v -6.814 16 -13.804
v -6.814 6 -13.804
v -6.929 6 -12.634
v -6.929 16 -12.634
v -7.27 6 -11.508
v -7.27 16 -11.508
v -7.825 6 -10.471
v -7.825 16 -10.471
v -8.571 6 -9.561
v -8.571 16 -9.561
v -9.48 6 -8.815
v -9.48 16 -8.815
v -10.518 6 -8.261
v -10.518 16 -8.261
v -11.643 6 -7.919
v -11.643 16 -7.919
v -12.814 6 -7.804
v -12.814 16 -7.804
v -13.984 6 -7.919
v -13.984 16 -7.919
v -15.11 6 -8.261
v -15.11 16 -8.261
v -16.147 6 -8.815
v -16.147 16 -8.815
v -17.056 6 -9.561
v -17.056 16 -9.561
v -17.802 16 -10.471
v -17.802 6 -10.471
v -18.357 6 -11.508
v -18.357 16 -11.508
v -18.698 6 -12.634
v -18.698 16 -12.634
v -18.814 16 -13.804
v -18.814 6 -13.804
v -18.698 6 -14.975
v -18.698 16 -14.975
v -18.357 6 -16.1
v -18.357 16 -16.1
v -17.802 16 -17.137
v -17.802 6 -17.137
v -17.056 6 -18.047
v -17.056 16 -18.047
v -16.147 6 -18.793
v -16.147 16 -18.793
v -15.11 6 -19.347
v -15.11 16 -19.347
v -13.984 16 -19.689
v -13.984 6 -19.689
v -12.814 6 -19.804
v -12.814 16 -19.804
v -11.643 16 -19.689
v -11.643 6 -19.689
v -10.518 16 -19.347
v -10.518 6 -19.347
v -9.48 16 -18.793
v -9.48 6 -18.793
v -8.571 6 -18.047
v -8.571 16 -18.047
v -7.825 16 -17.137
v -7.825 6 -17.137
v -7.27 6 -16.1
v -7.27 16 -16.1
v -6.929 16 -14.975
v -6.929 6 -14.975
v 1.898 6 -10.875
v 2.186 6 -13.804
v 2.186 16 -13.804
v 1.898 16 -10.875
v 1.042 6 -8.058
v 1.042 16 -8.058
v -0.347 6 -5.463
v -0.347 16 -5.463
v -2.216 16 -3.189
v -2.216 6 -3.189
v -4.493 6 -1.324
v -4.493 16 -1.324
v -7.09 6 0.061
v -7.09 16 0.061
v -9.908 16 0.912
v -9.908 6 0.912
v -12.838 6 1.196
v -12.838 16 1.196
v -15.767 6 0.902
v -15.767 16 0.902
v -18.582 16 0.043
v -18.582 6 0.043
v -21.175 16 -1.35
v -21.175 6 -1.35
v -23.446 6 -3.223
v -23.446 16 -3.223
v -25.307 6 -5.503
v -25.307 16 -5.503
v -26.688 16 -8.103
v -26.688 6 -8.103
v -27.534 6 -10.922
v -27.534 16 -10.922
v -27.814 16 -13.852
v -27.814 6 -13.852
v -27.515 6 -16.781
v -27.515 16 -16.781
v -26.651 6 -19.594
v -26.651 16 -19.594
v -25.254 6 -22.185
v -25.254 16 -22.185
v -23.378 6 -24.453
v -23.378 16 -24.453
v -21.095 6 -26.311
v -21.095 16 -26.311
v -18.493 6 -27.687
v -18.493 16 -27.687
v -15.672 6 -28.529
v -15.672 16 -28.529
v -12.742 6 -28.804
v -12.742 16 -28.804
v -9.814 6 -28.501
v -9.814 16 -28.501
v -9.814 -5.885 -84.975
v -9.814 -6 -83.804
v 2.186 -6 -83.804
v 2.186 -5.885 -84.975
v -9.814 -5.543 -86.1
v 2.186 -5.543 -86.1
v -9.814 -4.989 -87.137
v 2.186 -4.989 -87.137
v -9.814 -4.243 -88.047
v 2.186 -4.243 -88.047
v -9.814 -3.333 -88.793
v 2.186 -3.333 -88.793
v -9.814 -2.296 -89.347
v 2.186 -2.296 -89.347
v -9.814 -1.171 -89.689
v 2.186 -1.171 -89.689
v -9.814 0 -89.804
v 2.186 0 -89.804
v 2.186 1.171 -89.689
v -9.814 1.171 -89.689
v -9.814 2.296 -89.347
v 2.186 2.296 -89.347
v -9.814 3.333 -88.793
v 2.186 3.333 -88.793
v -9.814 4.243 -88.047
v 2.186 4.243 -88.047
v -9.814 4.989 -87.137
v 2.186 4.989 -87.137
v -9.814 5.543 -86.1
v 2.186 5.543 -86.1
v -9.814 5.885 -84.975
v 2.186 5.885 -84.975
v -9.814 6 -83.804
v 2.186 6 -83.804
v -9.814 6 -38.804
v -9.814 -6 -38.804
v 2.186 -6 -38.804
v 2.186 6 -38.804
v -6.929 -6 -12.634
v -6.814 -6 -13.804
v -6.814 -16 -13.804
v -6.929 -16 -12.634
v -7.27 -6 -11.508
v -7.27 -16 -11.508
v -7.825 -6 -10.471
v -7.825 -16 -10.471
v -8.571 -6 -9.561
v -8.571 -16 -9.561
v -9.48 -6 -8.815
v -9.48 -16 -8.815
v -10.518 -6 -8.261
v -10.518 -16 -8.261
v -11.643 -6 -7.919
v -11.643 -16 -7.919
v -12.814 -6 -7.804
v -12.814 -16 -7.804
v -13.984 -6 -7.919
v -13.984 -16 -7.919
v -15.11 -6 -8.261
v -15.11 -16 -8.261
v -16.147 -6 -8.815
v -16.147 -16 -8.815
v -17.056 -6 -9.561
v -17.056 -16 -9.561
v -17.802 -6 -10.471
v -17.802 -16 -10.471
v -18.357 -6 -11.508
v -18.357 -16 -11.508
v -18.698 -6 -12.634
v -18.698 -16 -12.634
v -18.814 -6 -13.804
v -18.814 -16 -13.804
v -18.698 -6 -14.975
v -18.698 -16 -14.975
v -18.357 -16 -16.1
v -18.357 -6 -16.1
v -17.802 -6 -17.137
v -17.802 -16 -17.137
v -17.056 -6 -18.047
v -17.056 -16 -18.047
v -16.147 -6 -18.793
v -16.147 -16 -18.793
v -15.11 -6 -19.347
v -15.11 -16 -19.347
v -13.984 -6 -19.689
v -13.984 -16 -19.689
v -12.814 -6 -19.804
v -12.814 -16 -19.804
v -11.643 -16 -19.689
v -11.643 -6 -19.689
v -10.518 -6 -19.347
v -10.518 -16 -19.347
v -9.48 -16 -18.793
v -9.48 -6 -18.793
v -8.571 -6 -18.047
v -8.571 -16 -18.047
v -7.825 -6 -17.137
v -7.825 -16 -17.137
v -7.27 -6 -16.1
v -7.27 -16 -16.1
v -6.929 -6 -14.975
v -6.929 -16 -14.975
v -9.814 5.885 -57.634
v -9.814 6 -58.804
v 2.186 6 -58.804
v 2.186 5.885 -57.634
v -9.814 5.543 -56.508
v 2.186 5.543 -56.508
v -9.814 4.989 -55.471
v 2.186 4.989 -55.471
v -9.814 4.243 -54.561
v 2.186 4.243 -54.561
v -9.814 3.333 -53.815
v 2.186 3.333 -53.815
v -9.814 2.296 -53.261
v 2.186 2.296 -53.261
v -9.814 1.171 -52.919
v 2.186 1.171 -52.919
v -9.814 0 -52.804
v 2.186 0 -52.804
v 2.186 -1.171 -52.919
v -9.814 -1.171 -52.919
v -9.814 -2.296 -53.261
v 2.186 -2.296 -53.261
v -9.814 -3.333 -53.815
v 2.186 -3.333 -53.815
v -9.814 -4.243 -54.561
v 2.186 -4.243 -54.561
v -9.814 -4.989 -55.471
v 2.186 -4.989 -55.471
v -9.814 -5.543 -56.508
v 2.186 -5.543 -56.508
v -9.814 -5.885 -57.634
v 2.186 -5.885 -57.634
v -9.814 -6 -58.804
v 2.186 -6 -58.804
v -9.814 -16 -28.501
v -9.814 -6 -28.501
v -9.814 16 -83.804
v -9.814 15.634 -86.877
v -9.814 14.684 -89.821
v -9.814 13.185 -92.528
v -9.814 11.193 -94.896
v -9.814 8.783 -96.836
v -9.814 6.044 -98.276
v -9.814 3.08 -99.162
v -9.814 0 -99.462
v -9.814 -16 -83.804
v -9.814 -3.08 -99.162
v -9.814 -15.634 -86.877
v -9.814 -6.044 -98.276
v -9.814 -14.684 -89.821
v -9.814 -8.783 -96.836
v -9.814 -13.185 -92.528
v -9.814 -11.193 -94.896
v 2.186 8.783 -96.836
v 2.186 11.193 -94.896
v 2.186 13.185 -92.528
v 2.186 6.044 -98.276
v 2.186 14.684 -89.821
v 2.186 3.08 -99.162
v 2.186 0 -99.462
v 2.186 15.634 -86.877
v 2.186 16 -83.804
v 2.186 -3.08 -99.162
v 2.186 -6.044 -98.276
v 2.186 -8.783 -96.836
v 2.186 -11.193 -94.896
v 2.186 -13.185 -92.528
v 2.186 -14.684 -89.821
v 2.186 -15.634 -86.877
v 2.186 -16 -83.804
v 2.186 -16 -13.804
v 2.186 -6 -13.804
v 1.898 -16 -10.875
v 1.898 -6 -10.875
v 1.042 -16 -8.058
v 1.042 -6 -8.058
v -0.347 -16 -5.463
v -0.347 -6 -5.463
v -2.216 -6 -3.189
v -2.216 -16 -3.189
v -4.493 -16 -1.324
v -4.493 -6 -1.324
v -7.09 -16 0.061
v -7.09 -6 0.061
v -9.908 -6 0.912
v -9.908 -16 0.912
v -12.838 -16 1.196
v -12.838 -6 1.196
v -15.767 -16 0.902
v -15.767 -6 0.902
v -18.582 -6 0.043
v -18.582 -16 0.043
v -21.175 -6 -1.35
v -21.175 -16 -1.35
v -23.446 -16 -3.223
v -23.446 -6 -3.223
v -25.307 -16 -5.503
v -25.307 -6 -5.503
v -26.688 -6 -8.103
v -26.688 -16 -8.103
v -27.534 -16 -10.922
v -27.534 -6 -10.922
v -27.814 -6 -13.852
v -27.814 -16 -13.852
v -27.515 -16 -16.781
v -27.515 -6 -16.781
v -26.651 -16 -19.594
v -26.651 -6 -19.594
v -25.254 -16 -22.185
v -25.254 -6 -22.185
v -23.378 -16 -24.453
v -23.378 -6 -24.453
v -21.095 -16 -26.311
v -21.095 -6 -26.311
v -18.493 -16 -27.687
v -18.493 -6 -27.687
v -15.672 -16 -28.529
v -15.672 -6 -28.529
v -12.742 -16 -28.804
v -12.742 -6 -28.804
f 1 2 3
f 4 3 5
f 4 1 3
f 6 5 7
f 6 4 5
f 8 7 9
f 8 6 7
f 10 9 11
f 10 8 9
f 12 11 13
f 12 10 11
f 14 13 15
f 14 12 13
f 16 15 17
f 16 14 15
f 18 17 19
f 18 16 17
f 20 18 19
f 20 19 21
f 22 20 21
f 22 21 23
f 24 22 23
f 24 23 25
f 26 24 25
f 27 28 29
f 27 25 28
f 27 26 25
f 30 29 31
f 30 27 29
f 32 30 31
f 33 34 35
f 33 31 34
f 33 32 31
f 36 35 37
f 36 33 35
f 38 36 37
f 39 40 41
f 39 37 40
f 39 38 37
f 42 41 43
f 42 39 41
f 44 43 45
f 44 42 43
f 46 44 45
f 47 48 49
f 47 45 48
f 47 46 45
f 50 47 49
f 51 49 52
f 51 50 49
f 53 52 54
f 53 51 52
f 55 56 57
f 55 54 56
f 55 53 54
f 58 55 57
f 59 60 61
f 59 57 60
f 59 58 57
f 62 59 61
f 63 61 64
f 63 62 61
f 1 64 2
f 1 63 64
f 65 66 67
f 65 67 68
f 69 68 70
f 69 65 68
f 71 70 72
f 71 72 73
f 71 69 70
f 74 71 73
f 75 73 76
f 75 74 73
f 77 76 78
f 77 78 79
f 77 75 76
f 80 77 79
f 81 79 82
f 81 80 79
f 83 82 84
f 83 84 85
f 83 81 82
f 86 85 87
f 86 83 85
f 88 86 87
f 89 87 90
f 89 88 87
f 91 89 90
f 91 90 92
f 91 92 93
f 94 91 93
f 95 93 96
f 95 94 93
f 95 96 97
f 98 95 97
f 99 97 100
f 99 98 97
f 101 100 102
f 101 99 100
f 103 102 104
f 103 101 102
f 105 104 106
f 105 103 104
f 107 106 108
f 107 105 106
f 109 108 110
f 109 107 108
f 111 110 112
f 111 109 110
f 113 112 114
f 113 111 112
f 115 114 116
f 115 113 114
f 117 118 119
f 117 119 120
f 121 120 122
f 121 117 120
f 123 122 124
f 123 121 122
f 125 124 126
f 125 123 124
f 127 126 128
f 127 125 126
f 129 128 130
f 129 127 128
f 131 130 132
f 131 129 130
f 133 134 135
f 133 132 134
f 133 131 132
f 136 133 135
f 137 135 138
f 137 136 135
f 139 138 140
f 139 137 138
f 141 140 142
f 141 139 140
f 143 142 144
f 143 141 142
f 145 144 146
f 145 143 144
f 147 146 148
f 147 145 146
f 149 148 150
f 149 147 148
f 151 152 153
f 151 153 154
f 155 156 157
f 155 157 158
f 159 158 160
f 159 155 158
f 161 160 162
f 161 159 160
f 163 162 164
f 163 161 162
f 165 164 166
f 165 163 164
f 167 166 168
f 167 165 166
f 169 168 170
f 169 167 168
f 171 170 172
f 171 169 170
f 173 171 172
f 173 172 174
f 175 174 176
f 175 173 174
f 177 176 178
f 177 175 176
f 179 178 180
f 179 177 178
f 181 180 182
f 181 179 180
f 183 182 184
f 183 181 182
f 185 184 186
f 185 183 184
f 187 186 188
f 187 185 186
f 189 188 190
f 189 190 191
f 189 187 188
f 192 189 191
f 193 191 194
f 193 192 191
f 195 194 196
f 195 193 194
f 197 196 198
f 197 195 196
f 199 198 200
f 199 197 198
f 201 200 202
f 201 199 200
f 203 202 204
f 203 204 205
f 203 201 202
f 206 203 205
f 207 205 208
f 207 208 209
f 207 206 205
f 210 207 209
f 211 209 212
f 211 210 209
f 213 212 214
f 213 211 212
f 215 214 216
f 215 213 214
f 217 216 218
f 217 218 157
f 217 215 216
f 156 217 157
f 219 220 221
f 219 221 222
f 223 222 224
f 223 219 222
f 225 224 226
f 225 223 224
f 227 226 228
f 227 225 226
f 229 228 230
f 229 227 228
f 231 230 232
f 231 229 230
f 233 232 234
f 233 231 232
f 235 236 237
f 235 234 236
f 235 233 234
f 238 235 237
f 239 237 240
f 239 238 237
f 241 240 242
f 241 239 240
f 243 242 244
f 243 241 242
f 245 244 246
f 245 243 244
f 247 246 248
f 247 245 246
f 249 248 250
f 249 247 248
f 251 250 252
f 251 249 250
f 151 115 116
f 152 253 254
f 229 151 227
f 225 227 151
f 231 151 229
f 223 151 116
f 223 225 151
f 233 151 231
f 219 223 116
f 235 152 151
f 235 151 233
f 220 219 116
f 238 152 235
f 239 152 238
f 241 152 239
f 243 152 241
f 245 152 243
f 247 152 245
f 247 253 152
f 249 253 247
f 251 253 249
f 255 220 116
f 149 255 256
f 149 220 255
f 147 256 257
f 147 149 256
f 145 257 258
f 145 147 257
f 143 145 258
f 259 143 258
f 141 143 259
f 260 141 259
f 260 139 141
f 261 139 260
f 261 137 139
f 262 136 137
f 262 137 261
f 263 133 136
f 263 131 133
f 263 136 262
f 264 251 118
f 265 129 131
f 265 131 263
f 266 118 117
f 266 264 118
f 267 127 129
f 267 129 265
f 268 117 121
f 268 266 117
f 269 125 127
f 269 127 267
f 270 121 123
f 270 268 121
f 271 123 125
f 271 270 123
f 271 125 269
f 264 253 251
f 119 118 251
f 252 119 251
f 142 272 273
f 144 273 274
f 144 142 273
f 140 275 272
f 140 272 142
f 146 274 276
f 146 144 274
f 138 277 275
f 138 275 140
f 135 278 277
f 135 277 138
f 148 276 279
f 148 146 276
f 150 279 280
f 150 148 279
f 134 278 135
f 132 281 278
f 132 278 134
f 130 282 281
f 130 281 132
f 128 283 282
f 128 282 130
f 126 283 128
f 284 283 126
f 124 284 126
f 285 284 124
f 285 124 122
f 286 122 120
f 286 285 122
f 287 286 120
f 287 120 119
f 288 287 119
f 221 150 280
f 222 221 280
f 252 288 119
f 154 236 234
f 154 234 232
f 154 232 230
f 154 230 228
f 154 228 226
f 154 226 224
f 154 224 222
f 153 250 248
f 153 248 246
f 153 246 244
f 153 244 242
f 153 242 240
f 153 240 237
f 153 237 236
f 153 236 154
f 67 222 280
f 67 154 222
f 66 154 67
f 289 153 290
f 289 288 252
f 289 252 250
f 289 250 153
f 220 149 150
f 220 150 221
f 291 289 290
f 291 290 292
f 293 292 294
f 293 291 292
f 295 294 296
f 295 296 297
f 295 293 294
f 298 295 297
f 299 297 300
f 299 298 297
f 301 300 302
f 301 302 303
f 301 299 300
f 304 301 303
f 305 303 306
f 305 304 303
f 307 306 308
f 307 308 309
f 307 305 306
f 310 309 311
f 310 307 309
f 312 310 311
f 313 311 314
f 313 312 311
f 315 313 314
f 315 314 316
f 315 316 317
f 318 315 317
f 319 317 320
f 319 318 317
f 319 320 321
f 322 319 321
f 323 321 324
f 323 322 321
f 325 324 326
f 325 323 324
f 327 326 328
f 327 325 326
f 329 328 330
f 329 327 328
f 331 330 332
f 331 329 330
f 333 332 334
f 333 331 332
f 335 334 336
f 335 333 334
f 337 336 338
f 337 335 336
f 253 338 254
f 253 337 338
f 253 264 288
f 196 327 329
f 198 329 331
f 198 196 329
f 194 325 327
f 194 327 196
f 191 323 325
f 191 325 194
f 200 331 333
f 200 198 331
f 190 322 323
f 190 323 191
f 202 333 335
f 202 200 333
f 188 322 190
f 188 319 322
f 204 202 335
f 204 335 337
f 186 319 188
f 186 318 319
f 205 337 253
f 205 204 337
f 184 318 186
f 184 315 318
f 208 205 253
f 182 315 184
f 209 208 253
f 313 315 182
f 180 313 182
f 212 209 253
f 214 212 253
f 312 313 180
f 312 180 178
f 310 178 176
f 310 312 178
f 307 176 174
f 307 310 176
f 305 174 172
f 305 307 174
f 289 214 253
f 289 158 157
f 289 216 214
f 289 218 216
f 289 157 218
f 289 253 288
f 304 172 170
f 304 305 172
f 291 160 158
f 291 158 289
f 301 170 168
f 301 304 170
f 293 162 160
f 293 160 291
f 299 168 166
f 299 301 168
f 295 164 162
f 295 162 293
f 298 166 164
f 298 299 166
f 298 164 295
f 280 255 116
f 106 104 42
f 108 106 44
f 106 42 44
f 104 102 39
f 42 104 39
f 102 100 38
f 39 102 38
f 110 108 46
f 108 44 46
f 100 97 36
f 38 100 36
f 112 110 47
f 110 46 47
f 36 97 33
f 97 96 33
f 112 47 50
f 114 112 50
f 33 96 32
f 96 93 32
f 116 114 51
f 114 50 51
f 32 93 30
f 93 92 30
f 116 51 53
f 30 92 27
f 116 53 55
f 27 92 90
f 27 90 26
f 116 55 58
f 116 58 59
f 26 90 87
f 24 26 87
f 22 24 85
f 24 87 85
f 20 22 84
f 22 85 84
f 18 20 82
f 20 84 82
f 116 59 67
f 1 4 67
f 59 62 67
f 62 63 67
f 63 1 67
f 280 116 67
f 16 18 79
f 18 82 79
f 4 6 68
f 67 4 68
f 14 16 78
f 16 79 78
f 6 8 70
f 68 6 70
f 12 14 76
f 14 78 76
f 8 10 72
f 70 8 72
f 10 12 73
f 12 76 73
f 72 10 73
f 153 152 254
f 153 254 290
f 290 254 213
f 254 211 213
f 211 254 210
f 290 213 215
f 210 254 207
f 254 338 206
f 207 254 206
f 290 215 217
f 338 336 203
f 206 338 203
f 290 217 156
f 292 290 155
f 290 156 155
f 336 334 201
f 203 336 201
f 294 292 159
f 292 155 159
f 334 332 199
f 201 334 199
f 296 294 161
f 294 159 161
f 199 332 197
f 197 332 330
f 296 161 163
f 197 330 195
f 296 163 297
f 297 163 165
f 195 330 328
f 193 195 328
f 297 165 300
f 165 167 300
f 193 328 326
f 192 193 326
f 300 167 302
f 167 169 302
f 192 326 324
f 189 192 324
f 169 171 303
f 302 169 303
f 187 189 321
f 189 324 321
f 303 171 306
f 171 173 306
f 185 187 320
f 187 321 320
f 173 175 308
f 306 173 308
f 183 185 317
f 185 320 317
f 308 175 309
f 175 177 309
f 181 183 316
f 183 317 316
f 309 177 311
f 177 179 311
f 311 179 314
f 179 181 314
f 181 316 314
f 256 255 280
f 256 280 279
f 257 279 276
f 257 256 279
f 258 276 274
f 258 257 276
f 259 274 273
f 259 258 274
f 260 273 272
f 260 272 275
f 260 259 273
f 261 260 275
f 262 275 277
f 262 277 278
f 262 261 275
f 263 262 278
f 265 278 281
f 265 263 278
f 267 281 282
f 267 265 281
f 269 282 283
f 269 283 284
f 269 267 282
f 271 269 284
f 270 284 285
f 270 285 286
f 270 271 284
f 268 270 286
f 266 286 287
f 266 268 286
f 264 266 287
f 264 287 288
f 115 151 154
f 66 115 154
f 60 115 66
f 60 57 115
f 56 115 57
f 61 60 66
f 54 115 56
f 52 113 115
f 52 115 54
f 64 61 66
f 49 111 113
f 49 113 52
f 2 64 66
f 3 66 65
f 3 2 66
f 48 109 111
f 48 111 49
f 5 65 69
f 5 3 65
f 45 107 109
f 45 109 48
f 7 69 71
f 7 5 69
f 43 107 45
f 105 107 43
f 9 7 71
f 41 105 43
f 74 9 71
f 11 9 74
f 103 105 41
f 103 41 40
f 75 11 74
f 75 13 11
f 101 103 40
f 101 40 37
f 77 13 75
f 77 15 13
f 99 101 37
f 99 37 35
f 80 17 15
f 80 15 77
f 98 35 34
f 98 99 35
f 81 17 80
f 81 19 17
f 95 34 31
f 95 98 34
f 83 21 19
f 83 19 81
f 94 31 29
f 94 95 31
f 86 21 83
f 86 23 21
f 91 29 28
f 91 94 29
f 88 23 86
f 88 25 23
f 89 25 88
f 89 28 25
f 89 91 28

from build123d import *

# Parameters (mm, degrees)
F0_R     = 6
F1_DEPTH = 16
F3_W     = 12
F3_H     = 25
F3_H_2   = 40
F4_DEPTH = 32.187343


with BuildPart() as f1:
    # F0 (on Front) → F1 (new body, symmetric)
    with BuildSketch(Plane.XZ):
        with BuildLine():
            Line((2.186343, -99.804071), (2.186343, -13.804071))
            ThreePointArc((2.186343, -13.804071), (-24.432607, -4.317238), (-9.813657, -28.501009))
            Line((-9.813657, -28.501009), (-9.813657, -99.804071))
            Line((-9.813657, -99.804071), (2.186343, -99.804071))
        make_face()
        with Locations((-12.813657, -13.804071)):
            Circle(F0_R, mode=Mode.SUBTRACT)
    extrude(amount=F1_DEPTH, both=True)

    # F3 (on offset) → F4 (cut, through all)
    with BuildSketch(Plane.YZ.offset(-30)):
        with BuildLine():
            ThreePointArc((16, -83.804071), (0, -99.461515), (-16, -83.804071))
            Line((-16, -83.804071), (-16, -99.804071))
            Line((-16, -99.804071), (16, -99.804071))
            Line((16, -99.804071), (16, -83.804071))
        make_face()
        with BuildLine():
            Line((-6, -58.804071), (6, -58.804071))
            ThreePointArc((6, -58.804071), (0, -52.804071), (-6, -58.804071))
        make_face()
        with BuildLine():
            ThreePointArc((-6, -83.804071), (0, -89.804071), (6, -83.804071))
            Line((6, -83.804071), (-6, -83.804071))
        make_face()
        with Locations((0, -71.304071)):
            Rectangle(F3_W, F3_H)
        with Locations((0, -18.804071)):
            Rectangle(F3_W, F3_H_2)
    extrude(amount=F4_DEPTH, mode=Mode.SUBTRACT)


solid = f1.part
